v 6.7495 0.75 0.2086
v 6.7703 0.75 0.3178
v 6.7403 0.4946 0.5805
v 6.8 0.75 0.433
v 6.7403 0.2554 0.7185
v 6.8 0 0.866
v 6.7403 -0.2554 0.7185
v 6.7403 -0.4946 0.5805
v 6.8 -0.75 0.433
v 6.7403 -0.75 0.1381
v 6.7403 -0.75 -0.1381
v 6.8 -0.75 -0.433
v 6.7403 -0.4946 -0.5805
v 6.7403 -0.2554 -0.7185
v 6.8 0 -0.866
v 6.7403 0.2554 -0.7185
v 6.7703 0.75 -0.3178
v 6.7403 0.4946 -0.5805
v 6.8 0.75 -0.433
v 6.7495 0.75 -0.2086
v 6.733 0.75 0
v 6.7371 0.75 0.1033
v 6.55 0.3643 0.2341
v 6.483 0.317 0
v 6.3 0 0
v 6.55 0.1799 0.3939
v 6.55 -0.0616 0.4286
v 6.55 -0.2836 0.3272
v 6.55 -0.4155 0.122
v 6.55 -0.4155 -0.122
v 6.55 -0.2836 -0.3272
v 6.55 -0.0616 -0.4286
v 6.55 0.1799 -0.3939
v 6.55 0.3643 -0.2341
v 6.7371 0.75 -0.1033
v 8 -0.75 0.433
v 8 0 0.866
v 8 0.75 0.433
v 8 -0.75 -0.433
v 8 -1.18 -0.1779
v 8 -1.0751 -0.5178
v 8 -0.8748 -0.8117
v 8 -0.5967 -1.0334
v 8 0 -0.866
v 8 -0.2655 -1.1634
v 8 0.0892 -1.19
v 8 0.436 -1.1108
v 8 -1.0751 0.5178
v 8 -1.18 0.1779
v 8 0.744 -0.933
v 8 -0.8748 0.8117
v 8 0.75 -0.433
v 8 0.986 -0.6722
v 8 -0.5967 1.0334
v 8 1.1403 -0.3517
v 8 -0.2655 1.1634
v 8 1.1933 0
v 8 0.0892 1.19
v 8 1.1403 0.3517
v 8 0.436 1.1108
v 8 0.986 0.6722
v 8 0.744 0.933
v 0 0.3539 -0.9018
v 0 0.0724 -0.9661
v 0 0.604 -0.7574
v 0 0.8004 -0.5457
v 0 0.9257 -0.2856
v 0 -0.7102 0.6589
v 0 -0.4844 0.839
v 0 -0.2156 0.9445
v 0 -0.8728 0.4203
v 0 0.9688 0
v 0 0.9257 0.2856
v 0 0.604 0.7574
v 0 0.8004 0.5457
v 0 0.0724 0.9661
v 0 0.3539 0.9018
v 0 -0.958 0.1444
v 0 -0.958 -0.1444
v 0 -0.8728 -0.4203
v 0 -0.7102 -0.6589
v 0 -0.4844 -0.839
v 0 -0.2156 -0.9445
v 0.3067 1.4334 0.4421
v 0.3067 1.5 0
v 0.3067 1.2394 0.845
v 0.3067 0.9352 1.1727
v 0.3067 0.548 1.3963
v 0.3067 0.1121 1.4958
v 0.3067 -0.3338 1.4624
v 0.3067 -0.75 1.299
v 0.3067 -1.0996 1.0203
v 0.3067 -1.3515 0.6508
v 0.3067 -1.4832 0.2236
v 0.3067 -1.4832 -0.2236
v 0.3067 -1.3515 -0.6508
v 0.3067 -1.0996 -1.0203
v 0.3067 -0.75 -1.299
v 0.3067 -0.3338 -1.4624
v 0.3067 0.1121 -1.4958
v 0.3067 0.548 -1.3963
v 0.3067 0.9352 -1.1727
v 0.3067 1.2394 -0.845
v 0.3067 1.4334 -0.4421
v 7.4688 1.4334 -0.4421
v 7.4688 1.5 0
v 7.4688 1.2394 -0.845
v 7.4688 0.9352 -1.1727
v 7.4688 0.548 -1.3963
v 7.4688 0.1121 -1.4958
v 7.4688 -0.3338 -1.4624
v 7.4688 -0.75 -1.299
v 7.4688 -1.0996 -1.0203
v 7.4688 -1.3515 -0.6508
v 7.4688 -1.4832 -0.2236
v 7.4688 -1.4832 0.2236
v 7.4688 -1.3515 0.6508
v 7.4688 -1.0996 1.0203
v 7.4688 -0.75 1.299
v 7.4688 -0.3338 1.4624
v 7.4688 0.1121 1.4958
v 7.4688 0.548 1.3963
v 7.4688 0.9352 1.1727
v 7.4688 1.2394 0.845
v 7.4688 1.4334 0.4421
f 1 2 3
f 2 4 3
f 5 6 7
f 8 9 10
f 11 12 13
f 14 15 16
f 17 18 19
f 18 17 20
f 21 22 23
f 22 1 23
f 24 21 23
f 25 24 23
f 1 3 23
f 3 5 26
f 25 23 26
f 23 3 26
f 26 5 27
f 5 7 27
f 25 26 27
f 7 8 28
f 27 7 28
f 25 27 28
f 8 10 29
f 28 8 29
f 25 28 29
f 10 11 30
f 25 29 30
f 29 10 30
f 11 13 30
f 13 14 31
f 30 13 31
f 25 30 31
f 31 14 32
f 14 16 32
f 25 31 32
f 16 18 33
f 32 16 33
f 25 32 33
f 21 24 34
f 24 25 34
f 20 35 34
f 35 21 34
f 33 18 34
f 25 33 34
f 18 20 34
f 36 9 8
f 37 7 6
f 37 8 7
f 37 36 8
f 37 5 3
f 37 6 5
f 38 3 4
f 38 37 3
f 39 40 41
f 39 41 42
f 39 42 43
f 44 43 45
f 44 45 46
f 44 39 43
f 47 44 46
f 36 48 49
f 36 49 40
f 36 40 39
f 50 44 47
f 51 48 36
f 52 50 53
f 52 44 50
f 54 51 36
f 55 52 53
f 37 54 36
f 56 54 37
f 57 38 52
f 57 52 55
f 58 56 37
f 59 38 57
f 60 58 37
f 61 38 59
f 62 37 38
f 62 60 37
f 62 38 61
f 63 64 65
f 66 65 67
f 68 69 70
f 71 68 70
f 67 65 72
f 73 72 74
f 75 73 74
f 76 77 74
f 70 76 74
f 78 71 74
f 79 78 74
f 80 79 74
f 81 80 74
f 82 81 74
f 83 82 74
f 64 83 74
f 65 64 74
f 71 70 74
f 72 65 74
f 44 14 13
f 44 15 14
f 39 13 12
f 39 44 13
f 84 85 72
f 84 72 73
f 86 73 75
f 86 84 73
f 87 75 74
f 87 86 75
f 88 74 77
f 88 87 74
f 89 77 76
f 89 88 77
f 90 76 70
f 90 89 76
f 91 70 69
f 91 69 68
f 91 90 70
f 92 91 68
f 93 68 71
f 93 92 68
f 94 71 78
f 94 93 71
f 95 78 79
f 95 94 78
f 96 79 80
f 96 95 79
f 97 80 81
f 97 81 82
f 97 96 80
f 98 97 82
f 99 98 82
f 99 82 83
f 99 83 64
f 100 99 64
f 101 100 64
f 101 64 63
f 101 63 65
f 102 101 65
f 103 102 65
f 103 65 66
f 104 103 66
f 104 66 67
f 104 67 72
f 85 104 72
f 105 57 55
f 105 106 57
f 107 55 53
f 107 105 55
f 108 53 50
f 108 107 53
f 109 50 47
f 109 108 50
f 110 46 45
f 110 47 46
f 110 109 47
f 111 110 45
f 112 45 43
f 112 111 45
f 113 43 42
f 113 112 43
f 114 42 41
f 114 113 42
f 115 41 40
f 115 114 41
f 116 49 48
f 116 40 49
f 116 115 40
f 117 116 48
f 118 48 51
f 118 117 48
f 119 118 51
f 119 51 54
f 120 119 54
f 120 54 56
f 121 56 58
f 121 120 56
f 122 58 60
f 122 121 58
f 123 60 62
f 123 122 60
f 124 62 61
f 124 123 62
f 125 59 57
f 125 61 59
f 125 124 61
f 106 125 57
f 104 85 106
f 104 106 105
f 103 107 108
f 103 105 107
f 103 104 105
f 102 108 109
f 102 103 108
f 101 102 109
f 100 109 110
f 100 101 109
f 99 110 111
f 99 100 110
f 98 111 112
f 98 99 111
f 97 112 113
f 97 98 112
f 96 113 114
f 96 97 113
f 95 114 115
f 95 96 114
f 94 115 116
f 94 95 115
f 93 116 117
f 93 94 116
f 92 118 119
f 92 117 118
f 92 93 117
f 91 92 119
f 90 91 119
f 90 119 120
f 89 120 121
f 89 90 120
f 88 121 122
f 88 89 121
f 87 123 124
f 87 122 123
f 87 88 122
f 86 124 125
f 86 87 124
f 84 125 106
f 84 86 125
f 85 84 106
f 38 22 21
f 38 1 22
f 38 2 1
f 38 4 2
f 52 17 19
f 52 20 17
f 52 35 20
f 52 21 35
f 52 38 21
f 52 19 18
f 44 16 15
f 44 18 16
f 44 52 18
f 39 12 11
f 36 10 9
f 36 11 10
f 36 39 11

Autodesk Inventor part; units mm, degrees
ref_plane "YZ Plane" through (0, 0, 0) normal (1, 0, 0) x (0, 1, 0)
ref_plane "XZ Plane" through (0, 0, 0) normal (0, 1, 0) x (-1, 0, 0)
sketch "Sketch1" plane through (0, 0, 0) normal (0, 0, 1) x (1, 0, 0)
  line L0 (0, 0) -> (6.3, 0)
  line L1 (8, 0.866) -> (8, 1.5)
  line L2 (8, 1.5) -> (0, 1.5)
  line L3 (8, 0.866) -> (6.8, 0.866)
  line L4 (6.8, 0.866) -> (6.3, 0)
  line L5 (0, -0.3) -> (0, 1.8) projected
  line L6 (0, 1.5) -> (0, 0)
  dimension "d0" = 1.2
  dimension "d1" = 60
  dimension "d2" = 3
  dimension "d3" = 1.7321
  dimension "d5" = 8
revolve "Body" add sketch "Sketch1" angle 360 about axis through (0, 0, 0) along (1, 0, 0)
chamfer "Chamfer1" distance 0.3067 angle 60 1 edges at (8, -1.5, 0) measured on face at (8, 1.2658, -0.1887)
sketch "Sketch2" plane through (8, 0, 0) normal (1, 0, 0) x (0, 0, -1)
  circle A0 centre (0, 0) radius 0.866 projected
  line L0 (-0.433, 0.75) -> (0.433, 0.75)
  line L1 (0.433, 0.75) -> (0.866, 0)
  line L2 (0.866, 0) -> (0.433, -0.75)
  line L3 (0.433, -0.75) -> (-0.433, -0.75)
  line L4 (-0.433, -0.75) -> (-0.866, 0)
  line L5 (-0.866, 0) -> (-0.433, 0.75)
extrude "Slot" add sketch "Sketch2" against normal up to next contours L1 A0 | A0 L2 | L0 A0 | A0 L3 | L5 A0 | A0 L4
thread "Thread" size "M3x0.5" class "6g" standard "ISO Metric profile" length 12
chamfer "Chamfer2" distance 0.3067 angle 60 1 edges at (0, -1.5, 0) measured on face at (2.4896, 1.4806, -0.2406)
ref_plane "Work Plane1" through (4, 0, 0) normal (0, 0.5, 0.866) x (1, 0, 0)
equation "\"d0\" = INTI"
equation "\"d2\" = NND"
equation "\"d3\" = 1.1547 * SW"
equation "\"d7\" = -0.5 * GD1 + 0.5 * NND"
equation "\"d8\" = FAWI"
equation "\"d29\" = -0.5 * GD1 + 0.5 * NND"
equation "\"d13\" = -0.5 * GD1 + 0.5 * NND"
equation "\"d14\" = FAWI"
equation "\"d30\" = -0.5 * GD1 + 0.5 * NND"
equation "\"NND\" = 3"
equation "\"NLG\" = 3"
equation "\"INTI\" = 1.2"
equation "\"FAWI\" = 60deg"
equation "\"SW\" = 1.5"
equation "\"GD1\" = THREADDIA - 1.2269 * PTC"
equation "\"FAWI1\" = 45deg"
equation "\"GUL\" = 0.61345 * PTC"
equation "\"SPD\" = 2"
equation "\"SEWI\" = 120deg"
equation "\"TOA\" = 30deg"
equation "\"THREADDIA\" = 3"
equation "\"PTC\" = 0.5"
equation "\"GAL\" = 0.61345 * PTC"
equation "\"E0\" = 1.155 * SW"
properties part number "Grub Screw 3x8mm" material "Stainless Steel, 440C"
